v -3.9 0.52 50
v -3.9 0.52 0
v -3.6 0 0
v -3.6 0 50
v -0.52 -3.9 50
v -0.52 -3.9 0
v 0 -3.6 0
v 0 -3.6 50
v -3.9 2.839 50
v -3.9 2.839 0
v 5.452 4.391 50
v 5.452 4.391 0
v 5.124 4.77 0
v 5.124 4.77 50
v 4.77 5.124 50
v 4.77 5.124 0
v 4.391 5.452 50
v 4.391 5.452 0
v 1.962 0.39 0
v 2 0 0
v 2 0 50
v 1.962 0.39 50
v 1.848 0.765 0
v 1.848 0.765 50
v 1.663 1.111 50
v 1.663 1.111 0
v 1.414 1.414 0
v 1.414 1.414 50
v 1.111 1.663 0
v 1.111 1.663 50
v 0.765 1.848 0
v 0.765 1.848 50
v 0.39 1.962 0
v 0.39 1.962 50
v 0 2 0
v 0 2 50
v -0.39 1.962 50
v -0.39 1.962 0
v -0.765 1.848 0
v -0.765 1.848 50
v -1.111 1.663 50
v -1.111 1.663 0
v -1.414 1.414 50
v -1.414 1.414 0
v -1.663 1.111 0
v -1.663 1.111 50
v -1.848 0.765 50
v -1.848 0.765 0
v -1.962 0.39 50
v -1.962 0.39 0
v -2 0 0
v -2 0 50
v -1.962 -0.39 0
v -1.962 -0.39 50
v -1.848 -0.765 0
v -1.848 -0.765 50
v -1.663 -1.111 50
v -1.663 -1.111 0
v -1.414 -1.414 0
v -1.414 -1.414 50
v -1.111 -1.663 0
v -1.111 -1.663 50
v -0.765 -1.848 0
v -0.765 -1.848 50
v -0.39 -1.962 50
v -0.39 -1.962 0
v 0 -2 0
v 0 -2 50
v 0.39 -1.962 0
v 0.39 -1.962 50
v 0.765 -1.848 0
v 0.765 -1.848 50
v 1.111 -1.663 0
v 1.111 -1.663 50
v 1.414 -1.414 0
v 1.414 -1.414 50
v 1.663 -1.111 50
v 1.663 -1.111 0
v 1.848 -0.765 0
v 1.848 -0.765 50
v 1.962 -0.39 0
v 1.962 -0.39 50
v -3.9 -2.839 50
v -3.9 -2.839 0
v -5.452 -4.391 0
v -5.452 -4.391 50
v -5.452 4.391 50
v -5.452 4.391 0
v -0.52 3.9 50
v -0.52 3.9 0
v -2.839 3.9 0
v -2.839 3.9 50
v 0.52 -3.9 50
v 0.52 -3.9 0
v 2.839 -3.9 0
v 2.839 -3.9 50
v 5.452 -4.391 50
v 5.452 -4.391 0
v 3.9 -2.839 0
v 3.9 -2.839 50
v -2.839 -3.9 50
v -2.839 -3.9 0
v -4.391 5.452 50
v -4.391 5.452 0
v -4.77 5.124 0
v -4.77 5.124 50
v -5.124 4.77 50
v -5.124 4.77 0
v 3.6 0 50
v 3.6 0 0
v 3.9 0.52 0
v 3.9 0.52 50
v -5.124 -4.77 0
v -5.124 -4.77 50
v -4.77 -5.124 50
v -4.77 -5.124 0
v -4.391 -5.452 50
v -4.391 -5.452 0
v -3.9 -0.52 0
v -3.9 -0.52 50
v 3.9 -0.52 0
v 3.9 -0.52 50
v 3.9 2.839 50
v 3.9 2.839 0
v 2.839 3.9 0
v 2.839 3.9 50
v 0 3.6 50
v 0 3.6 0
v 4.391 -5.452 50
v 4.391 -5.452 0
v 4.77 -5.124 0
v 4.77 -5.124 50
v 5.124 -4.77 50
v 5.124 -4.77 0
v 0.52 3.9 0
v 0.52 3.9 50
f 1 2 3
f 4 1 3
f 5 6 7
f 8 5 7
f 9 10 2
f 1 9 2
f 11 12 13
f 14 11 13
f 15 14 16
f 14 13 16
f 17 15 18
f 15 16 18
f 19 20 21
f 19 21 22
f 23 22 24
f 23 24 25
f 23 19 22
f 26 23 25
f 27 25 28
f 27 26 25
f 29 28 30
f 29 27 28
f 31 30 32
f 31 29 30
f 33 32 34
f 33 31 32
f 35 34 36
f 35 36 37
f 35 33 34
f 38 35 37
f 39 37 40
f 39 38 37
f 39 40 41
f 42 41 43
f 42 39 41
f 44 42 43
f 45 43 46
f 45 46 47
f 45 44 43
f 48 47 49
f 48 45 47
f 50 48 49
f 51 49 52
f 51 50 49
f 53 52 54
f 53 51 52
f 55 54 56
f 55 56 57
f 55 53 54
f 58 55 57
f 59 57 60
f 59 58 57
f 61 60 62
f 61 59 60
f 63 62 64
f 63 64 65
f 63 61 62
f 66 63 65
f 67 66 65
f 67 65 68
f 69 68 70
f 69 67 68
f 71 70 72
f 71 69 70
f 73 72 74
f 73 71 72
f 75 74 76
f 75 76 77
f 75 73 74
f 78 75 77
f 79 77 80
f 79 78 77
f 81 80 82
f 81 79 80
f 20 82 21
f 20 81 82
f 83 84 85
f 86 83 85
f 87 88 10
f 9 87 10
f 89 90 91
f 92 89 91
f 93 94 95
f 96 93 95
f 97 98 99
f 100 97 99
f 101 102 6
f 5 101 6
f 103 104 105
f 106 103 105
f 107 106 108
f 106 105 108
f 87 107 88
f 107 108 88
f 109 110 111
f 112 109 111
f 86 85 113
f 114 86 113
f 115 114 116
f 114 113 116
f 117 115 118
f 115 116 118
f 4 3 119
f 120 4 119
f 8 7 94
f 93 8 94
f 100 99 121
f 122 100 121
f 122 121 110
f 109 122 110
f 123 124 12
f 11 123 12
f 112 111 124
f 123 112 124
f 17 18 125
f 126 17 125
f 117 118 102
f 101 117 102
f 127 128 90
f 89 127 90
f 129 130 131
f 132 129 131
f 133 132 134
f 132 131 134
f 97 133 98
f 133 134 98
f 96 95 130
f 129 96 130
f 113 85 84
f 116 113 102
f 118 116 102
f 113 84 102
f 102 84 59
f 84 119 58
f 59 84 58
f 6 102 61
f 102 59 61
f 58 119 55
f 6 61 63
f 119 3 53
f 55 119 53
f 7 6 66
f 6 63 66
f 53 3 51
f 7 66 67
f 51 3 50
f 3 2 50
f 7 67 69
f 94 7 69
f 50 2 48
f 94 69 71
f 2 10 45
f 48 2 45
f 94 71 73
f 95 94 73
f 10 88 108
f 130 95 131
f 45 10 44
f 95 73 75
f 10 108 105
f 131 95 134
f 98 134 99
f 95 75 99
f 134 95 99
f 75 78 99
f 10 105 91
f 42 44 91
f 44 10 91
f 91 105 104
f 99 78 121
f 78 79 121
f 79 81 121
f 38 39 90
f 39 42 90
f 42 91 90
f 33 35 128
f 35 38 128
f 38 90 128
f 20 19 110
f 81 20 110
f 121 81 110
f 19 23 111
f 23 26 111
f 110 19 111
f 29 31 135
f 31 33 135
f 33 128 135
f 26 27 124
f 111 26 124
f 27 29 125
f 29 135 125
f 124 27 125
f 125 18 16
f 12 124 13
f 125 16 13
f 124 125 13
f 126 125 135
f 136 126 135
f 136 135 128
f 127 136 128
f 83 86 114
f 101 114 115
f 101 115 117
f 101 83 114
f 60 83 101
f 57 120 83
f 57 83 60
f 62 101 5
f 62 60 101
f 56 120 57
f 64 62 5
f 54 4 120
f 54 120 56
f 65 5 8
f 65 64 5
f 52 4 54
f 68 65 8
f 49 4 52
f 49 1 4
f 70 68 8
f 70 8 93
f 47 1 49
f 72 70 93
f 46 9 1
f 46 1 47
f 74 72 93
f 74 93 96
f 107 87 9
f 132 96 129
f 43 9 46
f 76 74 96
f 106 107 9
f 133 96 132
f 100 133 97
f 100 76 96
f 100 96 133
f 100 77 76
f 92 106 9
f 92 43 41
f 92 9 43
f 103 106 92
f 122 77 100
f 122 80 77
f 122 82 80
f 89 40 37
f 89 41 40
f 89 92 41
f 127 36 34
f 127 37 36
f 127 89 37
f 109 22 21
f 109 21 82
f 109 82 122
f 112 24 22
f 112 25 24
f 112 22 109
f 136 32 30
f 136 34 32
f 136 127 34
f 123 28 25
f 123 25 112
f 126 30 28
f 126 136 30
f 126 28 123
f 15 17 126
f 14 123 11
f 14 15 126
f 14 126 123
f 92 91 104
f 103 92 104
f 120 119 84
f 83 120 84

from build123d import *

# Parameters (mm, degrees)
SKETCH1_R           = 2
BOSS_EXTRUDE1_DEPTH = 50


with BuildPart() as part:
    # Sketch1 → Boss-Extrude1 (new body)
    with BuildSketch(Plane.XY):
        with BuildLine():
            Line((3.9, 2.839339828), (5.451585007, 4.390924835))
            ThreePointArc((5.451585007, 4.390924835), (4.949747468, 4.949747468), (4.390924835, 5.451585007))
            Line((4.390924835, 5.451585007), (2.839339828, 3.9))
            Line((2.839339828, 3.9), (0.519615242, 3.9))
            Line((0.519615242, 3.9), (0, 3.6))
            Line((0, 3.6), (-0.519615242, 3.9))
            Line((-0.519615242, 3.9), (-2.839339828, 3.9))
            Line((-2.839339828, 3.9), (-4.390924835, 5.451585007))
            ThreePointArc((-4.390924835, 5.451585007), (-4.949747468, 4.949747468), (-5.451585007, 4.390924835))
            Line((-5.451585007, 4.390924835), (-3.9, 2.839339828))
            Line((-3.9, 2.839339828), (-3.9, 0.519615242))
            Line((-3.9, 0.519615242), (-3.6, 0))
            Line((-3.6, 0), (-3.9, -0.519615242))
            Line((-3.9, -0.519615242), (-3.9, -2.839339828))
            Line((-3.9, -2.839339828), (-5.451585007, -4.390924835))
            ThreePointArc((-5.451585007, -4.390924835), (-4.949747468, -4.949747468), (-4.390924835, -5.451585007))
            Line((-4.390924835, -5.451585007), (-2.839339828, -3.9))
            Line((-2.839339828, -3.9), (-0.519615242, -3.9))
            Line((-0.519615242, -3.9), (0, -3.6))
            Line((0, -3.6), (0.519615242, -3.9))
            Line((0.519615242, -3.9), (2.839339828, -3.9))
            Line((2.839339828, -3.9), (4.390924835, -5.451585007))
            ThreePointArc((4.390924835, -5.451585007), (4.949747468, -4.949747468), (5.451585007, -4.390924835))
            Line((5.451585007, -4.390924835), (3.9, -2.839339828))
            Line((3.9, -2.839339828), (3.9, -0.519615242))
            Line((3.9, -0.519615242), (3.6, 0))
            Line((3.6, 0), (3.9, 0.519615242))
            Line((3.9, 0.519615242), (3.9, 2.839339828))
        make_face()
        Circle(SKETCH1_R, mode=Mode.SUBTRACT)
    extrude(amount=BOSS_EXTRUDE1_DEPTH)


solid = part.part
